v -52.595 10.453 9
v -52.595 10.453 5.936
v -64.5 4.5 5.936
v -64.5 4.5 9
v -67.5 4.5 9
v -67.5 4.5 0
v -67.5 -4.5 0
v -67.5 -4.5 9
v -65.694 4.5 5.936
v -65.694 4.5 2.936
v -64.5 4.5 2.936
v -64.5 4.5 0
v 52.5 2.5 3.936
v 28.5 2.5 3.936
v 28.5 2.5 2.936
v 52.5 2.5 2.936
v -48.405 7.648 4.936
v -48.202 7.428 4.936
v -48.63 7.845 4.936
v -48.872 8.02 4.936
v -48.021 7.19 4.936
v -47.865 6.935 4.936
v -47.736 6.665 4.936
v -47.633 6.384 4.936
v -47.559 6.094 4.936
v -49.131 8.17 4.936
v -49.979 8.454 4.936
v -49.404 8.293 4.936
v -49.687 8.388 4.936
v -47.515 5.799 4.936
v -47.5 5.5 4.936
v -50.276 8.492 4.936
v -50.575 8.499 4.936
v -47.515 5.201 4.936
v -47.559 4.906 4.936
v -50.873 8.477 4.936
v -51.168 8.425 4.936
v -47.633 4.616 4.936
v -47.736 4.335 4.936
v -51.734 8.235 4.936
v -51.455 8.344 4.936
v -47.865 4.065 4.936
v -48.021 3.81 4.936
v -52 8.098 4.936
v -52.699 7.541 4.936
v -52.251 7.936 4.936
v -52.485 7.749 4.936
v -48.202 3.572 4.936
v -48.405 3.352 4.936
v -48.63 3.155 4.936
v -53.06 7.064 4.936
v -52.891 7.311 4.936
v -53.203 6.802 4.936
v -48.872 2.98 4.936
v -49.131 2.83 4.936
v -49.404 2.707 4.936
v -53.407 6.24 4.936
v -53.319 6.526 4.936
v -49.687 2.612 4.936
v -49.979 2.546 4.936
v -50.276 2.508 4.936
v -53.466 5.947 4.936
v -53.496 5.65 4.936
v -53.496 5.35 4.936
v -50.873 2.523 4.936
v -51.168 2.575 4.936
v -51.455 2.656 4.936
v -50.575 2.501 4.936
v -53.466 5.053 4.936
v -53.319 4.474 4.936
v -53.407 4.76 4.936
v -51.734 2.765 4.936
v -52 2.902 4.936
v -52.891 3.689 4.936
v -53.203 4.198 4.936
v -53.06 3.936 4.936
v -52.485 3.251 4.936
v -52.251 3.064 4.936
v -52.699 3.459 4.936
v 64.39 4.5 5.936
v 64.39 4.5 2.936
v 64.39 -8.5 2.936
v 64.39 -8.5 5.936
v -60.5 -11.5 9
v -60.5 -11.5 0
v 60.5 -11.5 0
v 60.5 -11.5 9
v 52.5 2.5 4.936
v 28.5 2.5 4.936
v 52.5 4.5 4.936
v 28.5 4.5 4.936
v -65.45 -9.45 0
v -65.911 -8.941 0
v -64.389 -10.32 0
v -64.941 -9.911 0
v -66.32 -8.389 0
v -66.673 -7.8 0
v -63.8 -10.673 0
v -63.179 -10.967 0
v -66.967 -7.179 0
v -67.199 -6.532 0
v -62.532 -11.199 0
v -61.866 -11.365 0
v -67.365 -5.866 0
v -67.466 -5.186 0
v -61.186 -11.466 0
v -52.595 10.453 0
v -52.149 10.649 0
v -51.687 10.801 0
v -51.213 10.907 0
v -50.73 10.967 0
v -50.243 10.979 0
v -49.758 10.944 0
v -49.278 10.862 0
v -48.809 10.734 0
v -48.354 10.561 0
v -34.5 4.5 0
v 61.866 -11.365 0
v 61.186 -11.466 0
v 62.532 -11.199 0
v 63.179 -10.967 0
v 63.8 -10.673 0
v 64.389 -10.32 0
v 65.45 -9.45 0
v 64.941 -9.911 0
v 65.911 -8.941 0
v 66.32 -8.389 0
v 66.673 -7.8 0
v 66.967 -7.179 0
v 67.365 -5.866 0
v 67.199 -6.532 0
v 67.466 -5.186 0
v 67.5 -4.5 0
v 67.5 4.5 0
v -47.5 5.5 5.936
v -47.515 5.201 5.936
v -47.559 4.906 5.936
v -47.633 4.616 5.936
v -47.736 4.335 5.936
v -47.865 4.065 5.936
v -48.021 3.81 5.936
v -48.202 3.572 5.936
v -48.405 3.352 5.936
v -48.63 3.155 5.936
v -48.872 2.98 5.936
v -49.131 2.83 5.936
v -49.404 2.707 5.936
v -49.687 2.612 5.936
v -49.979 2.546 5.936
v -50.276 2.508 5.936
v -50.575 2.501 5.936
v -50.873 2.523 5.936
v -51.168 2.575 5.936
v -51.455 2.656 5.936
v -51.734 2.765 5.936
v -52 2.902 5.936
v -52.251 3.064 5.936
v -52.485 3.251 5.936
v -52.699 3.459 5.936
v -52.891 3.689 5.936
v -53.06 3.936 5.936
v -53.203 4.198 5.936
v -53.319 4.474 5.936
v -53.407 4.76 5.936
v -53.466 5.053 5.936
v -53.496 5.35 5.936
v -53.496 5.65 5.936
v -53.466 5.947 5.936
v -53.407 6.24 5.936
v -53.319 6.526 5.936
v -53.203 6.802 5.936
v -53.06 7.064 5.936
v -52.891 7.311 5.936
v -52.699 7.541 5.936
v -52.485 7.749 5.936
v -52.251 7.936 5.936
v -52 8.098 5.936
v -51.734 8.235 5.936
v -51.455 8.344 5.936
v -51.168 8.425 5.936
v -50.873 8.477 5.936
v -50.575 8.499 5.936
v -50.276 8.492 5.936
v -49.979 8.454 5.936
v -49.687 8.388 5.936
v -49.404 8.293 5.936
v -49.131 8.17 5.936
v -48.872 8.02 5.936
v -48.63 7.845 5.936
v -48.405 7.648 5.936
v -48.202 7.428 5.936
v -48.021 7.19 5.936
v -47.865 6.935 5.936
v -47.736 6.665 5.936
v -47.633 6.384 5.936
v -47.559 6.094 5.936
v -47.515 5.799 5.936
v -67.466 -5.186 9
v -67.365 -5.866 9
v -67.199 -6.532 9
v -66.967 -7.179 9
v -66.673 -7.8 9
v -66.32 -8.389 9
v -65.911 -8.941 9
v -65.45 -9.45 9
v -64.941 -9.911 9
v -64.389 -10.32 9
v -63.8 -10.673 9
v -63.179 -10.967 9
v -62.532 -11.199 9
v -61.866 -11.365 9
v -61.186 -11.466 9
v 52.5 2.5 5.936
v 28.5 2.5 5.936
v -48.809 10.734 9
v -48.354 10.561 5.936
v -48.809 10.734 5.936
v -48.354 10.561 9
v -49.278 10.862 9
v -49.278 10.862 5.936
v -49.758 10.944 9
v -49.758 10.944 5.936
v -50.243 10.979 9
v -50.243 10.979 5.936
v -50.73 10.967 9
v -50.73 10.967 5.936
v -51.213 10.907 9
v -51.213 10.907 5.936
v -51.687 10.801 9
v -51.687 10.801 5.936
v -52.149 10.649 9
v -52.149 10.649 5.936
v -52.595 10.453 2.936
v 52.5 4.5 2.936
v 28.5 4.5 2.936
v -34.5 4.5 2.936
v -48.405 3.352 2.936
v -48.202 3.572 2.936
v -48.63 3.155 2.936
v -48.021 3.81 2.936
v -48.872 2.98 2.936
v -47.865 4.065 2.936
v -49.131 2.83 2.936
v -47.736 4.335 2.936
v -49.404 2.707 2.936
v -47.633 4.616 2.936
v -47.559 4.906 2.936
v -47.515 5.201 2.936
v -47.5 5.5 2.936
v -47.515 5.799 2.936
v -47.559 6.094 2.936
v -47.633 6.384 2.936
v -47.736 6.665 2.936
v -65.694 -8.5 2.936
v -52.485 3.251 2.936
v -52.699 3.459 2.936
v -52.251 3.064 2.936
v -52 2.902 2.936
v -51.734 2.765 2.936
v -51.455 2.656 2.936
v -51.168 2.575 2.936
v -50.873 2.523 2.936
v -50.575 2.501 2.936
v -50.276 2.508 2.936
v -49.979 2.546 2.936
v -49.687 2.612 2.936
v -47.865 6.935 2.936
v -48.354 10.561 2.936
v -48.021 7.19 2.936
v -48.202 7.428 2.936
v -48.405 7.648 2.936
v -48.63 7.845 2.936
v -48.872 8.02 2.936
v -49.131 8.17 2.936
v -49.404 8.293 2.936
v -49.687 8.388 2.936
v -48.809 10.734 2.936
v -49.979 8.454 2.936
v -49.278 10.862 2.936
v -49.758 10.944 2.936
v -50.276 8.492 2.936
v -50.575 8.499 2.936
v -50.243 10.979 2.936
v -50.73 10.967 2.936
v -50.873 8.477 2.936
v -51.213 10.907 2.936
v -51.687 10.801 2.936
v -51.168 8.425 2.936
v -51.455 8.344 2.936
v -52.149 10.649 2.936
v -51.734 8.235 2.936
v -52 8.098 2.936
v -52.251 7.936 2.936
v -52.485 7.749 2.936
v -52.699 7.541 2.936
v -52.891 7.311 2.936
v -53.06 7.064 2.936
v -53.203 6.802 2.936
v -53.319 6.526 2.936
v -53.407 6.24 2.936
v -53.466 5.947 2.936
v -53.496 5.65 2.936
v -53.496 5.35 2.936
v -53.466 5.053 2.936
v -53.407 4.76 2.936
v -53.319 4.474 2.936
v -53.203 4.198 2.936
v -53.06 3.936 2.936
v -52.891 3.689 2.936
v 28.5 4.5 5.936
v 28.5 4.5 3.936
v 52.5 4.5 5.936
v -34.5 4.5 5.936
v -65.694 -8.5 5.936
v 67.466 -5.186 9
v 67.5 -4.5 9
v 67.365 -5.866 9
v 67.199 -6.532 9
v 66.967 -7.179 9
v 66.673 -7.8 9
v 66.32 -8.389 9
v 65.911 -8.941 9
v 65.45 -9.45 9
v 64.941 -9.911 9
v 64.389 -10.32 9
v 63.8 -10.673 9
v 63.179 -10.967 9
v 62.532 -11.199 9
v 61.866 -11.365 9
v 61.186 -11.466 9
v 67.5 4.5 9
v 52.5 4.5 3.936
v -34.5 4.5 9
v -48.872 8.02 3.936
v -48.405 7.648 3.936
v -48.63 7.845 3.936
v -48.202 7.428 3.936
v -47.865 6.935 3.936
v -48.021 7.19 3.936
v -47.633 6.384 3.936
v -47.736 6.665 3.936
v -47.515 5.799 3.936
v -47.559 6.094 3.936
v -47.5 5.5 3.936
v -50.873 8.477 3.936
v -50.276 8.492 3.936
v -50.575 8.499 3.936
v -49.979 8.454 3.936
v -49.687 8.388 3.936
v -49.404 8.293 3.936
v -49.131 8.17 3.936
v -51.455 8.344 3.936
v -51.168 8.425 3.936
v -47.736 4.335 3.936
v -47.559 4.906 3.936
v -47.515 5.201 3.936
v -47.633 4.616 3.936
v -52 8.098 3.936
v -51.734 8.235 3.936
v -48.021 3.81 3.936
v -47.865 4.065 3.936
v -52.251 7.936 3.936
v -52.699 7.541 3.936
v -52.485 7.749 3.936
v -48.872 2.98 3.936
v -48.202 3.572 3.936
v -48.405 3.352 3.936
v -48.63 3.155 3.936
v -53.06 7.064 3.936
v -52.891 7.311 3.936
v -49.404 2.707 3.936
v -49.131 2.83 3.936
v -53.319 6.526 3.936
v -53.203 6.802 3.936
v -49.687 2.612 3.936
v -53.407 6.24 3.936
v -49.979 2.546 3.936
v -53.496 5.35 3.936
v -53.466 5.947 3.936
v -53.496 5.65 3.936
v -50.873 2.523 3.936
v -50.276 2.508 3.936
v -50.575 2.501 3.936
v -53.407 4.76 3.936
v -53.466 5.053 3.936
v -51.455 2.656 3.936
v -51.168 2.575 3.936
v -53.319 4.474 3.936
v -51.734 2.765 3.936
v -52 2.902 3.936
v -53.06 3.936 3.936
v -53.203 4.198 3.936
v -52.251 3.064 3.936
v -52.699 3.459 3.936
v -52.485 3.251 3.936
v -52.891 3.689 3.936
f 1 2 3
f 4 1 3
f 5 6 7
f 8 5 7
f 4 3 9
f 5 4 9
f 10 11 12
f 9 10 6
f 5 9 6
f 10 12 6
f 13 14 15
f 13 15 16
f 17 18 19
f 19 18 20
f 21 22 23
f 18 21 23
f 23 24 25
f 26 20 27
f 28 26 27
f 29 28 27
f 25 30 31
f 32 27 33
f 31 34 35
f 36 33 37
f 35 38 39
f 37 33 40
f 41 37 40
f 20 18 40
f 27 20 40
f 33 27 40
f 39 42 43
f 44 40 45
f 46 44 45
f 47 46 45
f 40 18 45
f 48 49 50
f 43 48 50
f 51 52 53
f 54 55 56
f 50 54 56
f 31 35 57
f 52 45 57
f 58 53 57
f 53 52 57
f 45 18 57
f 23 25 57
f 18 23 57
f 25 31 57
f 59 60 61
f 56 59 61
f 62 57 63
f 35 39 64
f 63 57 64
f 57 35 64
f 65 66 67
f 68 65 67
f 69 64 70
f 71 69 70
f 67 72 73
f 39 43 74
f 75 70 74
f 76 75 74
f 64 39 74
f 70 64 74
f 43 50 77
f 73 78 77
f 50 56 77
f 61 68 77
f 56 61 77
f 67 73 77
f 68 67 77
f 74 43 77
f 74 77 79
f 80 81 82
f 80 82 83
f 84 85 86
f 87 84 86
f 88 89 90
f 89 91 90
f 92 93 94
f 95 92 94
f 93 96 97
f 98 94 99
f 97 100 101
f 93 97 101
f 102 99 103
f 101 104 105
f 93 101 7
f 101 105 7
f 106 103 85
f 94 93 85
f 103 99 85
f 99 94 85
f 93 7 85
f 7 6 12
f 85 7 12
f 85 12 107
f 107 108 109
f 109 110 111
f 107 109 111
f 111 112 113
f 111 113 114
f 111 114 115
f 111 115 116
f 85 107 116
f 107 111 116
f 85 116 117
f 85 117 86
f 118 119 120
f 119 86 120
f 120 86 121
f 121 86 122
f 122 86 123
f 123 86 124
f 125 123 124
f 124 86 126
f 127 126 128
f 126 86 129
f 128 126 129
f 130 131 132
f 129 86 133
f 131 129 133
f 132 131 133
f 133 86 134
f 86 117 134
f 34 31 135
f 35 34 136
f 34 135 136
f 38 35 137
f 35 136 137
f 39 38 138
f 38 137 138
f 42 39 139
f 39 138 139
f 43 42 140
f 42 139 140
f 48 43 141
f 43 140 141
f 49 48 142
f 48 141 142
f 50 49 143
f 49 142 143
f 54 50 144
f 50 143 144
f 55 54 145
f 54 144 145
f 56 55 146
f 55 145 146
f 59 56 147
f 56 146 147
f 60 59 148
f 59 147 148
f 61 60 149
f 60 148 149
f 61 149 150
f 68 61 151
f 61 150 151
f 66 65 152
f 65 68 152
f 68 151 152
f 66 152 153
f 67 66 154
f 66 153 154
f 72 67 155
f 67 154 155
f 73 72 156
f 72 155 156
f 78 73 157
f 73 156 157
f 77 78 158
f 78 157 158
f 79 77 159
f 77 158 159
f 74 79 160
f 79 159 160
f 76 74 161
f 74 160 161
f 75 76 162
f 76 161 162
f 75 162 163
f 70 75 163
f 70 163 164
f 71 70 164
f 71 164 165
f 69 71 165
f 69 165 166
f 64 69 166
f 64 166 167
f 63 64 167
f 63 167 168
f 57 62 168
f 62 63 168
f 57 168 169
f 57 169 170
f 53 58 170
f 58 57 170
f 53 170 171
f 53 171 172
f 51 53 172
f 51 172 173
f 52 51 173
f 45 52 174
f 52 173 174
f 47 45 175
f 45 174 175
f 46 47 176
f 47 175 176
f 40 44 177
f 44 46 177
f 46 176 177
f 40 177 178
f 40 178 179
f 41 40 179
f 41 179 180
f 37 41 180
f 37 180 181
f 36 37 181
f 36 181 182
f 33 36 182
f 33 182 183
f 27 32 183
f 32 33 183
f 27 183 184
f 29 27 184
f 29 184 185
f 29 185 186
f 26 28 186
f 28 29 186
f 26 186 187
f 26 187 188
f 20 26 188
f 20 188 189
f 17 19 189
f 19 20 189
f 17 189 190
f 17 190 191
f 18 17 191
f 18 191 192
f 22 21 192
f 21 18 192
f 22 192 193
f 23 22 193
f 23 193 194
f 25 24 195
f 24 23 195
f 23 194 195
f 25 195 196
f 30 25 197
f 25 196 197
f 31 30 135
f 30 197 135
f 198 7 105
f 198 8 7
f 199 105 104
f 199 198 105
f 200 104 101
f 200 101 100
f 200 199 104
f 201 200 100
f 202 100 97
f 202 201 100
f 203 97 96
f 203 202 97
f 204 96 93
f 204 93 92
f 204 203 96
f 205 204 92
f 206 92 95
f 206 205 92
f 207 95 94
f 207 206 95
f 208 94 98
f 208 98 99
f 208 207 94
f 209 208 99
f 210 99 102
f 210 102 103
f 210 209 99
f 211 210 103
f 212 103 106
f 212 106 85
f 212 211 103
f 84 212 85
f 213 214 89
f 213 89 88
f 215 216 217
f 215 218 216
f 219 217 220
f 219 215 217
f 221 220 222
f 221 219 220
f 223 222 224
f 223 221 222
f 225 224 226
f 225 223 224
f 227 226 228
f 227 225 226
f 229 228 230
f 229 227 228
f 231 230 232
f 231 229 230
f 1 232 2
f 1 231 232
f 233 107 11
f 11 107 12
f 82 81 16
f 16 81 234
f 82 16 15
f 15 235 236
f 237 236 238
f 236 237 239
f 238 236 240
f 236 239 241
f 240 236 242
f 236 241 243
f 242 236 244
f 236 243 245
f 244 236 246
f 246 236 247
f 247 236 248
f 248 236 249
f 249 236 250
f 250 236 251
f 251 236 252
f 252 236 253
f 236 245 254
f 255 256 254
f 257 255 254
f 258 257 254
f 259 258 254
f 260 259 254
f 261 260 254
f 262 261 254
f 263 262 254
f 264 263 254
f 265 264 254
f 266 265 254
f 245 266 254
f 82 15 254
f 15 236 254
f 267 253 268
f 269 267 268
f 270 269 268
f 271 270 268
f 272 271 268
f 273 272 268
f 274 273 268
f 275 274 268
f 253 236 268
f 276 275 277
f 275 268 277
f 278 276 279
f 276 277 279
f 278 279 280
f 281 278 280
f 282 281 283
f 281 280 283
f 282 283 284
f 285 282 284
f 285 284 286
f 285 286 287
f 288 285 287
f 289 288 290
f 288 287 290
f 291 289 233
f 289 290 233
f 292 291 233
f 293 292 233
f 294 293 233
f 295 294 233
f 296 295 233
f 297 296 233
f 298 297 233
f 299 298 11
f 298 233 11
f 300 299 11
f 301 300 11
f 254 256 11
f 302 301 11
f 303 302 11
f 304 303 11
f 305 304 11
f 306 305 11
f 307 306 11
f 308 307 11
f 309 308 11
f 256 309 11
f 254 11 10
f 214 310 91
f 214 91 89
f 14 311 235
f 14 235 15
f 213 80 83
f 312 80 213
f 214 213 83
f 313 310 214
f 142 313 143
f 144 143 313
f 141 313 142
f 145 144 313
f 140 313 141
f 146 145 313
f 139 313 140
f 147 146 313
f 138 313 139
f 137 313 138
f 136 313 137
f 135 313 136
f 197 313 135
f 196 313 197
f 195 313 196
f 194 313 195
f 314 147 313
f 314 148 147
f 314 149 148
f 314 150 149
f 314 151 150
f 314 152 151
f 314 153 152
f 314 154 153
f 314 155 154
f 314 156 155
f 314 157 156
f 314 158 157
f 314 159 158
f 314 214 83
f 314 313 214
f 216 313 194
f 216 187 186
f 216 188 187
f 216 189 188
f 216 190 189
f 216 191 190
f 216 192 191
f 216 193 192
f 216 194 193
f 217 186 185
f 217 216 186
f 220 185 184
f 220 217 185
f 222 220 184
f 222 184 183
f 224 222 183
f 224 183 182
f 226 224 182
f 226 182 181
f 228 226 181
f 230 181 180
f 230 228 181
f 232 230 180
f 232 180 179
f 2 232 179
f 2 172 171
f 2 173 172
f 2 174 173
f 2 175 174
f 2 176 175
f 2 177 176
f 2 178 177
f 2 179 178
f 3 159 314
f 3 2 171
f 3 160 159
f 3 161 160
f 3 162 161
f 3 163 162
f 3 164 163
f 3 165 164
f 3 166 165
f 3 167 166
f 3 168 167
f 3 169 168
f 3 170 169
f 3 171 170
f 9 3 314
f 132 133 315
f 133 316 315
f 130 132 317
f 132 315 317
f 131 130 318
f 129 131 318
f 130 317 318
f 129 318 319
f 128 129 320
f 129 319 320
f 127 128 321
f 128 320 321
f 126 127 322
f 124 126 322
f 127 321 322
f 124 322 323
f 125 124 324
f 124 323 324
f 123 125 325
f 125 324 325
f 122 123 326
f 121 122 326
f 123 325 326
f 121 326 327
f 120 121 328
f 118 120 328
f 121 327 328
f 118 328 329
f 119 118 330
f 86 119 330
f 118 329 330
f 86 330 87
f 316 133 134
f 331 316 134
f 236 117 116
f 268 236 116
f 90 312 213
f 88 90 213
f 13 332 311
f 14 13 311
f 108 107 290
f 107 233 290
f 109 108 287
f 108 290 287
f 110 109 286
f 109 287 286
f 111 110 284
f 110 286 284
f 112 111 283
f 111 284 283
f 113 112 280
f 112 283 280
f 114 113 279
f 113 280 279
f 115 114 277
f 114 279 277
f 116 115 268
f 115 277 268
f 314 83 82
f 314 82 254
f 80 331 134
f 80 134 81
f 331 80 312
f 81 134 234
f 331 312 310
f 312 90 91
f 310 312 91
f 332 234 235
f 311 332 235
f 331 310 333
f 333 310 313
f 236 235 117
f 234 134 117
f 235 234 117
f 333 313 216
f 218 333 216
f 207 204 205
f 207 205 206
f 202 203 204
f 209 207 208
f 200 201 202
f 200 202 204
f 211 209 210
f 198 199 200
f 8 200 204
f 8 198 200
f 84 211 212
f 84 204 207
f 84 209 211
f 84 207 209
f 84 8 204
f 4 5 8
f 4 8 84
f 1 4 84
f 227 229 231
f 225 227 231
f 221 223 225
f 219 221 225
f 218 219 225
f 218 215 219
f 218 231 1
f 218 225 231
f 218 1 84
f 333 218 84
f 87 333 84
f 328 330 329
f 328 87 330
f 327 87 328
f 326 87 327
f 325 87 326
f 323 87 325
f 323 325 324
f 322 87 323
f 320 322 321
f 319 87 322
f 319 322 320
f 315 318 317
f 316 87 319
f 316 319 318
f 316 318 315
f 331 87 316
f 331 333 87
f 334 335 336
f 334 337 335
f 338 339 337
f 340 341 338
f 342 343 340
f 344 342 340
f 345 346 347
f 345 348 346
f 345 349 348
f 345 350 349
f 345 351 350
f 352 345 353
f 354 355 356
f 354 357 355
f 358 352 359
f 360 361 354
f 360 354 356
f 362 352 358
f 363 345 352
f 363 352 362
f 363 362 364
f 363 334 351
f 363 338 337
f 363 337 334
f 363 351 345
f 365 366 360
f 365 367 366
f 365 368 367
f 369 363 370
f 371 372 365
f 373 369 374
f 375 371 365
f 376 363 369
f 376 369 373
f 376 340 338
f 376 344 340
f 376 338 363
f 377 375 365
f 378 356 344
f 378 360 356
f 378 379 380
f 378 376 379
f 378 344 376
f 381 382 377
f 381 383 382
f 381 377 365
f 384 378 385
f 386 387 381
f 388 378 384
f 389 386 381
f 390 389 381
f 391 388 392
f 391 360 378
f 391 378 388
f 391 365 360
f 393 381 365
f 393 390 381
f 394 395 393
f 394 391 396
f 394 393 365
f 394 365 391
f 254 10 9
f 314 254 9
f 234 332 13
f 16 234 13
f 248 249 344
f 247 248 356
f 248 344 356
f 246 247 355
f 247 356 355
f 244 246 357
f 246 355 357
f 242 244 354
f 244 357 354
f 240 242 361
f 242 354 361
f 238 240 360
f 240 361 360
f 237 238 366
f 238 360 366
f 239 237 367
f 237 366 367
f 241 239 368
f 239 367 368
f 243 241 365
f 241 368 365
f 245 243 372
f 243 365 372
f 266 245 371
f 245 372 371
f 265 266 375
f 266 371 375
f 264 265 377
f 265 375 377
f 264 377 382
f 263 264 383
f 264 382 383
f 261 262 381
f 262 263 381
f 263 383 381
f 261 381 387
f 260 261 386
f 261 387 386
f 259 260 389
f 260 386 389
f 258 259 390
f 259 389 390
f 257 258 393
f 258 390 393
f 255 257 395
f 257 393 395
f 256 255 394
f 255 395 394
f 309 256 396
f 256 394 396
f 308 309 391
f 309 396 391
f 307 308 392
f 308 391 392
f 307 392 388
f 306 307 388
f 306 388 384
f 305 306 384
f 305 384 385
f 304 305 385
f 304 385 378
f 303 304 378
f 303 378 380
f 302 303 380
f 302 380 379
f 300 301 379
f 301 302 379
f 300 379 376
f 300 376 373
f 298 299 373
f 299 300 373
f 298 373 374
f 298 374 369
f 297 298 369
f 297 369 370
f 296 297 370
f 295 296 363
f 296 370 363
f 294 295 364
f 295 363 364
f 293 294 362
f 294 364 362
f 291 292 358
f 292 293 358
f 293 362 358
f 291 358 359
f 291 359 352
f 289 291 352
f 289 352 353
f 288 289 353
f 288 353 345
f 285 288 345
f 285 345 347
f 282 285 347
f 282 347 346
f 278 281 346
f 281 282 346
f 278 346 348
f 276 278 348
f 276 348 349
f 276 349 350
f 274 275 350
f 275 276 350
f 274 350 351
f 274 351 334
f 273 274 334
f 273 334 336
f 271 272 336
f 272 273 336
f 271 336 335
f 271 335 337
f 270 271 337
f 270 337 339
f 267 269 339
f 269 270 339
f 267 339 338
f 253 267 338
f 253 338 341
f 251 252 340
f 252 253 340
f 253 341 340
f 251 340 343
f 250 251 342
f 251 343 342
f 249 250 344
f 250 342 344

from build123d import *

# Parameters (mm, degrees)
F1_DEPTH  = 9
F2_W      = 130.0831899747
F2_H      = 3
F3_DEPTH  = 13
F4_DEPTH  = 25
F5_W      = 24
F5_H      = 2
F6_DEPTH  = 3
F8_R      = 3
F9_DEPTH  = 4
F7_W      = 24
F7_H      = 1
F7_W_2    = 93.5030970573
F10_DEPTH = 10
F11_DEPTH = 25
F12_R     = 5
F13_R     = 7


with BuildPart() as f1:
    # F0 (on Top) → F1 (new body)
    with BuildSketch(Plane.XY):
        Polygon((-64.5, 4.5), (-67.5, 4.5), (-67.5, -11.5), (67.5, -11.5), (67.5, 4.5), (-34.5, 4.5), align=None)
        Polygon((-34.5, 4.5), (-50.5, 11.5), (-64.5, 4.5), align=None)
    extrude(amount=F1_DEPTH)

    # F2 (on face) → F3 (cut)
    with BuildSketch(Plane(origin=(0, 4.5, 0), x_dir=(-1, 0, 0), z_dir=(0, 1, 0))):
        with Locations((0.6519891322, 4.4357408187)):
            Rectangle(F2_W, F2_H)
    extrude(amount=-F3_DEPTH, mode=Mode.SUBTRACT)

    # F4 (cut): a face of the model
    f4_faces = [f1.faces().sort_by_distance(p)[0] for p in [
        (-0.6519891322, -8.5, 4.4357408187),
    ]]
    extrude(f4_faces, amount=F4_DEPTH, mode=Mode.SUBTRACT)

    # F5 (on face) → F6 (join)
    with BuildSketch(Plane(origin=(0, 0, 5.9357408187), x_dir=(1, 0, 0), z_dir=(0, 0, -1))):
        with Locations((40.5, -3.5)):
            Rectangle(F5_W, F5_H)
    extrude(amount=F6_DEPTH)

    # F8 (on face) → F9 (join)
    with BuildSketch(Plane(origin=(0, 0, 5.9357408187), x_dir=(1, 0, 0), z_dir=(0, 0, -1))):
        with Locations((-50.5, -5.5)):
            Circle(F8_R)
    extrude(amount=F9_DEPTH)

    # F7 (on face) → F10 (cut)
    with BuildSketch(Plane(origin=(0, 4.5, 0), x_dir=(-1, 0, 0), z_dir=(0, 1, 0))):
        with Locations((-40.5, 4.4357408187)):
            Rectangle(F7_W, F7_H)
        with Locations((18.2515485287, 4.4357408187)):
            Rectangle(F7_W_2, F7_H)
    extrude(amount=-F10_DEPTH, mode=Mode.SUBTRACT)

    # F7 (on face) → F11 (cut)
    with BuildSketch(Plane(origin=(0, 4.5, 0), x_dir=(-1, 0, 0), z_dir=(0, 1, 0))):
        with Locations((18.2515485287, 4.4357408187)):
            Rectangle(F7_W_2, F7_H)
    extrude(amount=F11_DEPTH, mode=Mode.SUBTRACT)

    # F12
    f12_edges = [f1.edges().sort_by_distance(p)[0] for p in [
        (-50.5, 11.5, 1.46787),
        (-50.5, 11.5, 7.46787),
    ]]
    fillet(f12_edges, radius=F12_R)

    # F13
    f13_edges = [f1.edges().sort_by_distance(p)[0] for p in [
        (-67.5, -11.5, 4.5),
        (67.5, -11.5, 4.5),
    ]]
    fillet(f13_edges, radius=F13_R)


solid = f1.part
